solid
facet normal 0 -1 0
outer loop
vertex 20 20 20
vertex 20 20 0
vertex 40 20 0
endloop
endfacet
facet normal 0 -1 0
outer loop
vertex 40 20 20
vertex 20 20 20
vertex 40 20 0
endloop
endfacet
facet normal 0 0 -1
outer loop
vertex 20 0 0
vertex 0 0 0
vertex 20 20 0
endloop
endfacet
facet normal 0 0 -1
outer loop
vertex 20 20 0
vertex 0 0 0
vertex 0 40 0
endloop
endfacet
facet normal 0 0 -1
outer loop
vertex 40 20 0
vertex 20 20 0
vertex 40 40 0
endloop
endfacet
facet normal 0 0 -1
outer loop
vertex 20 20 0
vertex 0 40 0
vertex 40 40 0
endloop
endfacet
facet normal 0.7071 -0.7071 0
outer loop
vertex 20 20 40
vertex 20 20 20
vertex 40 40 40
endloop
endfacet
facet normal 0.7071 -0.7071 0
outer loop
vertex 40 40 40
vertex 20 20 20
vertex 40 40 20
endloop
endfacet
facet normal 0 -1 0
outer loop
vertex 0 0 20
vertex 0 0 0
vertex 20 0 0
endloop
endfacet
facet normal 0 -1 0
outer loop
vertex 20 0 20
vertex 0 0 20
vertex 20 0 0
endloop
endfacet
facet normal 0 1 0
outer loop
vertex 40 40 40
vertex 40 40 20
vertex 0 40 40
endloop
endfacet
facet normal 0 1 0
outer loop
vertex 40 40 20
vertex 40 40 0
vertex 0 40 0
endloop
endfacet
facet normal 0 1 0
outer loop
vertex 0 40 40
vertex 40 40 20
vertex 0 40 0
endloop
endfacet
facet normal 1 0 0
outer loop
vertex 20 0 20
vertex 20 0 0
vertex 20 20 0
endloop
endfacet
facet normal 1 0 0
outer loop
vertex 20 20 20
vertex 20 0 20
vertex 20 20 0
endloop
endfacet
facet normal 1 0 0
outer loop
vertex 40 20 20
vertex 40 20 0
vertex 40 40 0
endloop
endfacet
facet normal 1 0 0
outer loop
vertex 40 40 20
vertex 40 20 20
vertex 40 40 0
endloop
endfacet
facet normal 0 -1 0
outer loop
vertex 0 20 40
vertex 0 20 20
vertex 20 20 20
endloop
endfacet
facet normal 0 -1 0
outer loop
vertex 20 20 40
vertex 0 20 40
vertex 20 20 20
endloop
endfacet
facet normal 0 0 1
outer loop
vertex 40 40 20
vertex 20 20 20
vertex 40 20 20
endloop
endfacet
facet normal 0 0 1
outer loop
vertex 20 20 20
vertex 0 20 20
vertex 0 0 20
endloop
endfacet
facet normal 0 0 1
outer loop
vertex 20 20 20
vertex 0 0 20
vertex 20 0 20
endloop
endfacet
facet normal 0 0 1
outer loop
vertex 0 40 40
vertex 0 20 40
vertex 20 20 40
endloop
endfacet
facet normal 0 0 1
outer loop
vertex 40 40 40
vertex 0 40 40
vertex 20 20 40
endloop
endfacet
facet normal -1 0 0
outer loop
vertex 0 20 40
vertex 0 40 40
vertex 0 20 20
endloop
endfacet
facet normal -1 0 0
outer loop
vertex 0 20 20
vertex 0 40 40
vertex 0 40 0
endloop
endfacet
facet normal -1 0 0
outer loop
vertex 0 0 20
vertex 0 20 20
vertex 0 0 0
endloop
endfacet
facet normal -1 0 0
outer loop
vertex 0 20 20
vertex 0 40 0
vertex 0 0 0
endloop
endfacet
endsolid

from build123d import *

# Parameters (mm, degrees)
F1_DEPTH = 20
F3_DEPTH = 20


with BuildPart() as f1:
    # F0 (on Top) → F1 (new body)
    with BuildSketch(Plane.XY):
        Polygon((0, 40), (0, 0), (20, 0), (20, 20), (40, 20), (40, 40), align=None)
    extrude(amount=F1_DEPTH)

    # F2 (on face) → F3 (join)
    with BuildSketch(Plane.XY.offset(20)):
        Polygon((0, 20), (20, 20), (40, 40), (0, 40), align=None)
    extrude(amount=F3_DEPTH)


solid = f1.part
